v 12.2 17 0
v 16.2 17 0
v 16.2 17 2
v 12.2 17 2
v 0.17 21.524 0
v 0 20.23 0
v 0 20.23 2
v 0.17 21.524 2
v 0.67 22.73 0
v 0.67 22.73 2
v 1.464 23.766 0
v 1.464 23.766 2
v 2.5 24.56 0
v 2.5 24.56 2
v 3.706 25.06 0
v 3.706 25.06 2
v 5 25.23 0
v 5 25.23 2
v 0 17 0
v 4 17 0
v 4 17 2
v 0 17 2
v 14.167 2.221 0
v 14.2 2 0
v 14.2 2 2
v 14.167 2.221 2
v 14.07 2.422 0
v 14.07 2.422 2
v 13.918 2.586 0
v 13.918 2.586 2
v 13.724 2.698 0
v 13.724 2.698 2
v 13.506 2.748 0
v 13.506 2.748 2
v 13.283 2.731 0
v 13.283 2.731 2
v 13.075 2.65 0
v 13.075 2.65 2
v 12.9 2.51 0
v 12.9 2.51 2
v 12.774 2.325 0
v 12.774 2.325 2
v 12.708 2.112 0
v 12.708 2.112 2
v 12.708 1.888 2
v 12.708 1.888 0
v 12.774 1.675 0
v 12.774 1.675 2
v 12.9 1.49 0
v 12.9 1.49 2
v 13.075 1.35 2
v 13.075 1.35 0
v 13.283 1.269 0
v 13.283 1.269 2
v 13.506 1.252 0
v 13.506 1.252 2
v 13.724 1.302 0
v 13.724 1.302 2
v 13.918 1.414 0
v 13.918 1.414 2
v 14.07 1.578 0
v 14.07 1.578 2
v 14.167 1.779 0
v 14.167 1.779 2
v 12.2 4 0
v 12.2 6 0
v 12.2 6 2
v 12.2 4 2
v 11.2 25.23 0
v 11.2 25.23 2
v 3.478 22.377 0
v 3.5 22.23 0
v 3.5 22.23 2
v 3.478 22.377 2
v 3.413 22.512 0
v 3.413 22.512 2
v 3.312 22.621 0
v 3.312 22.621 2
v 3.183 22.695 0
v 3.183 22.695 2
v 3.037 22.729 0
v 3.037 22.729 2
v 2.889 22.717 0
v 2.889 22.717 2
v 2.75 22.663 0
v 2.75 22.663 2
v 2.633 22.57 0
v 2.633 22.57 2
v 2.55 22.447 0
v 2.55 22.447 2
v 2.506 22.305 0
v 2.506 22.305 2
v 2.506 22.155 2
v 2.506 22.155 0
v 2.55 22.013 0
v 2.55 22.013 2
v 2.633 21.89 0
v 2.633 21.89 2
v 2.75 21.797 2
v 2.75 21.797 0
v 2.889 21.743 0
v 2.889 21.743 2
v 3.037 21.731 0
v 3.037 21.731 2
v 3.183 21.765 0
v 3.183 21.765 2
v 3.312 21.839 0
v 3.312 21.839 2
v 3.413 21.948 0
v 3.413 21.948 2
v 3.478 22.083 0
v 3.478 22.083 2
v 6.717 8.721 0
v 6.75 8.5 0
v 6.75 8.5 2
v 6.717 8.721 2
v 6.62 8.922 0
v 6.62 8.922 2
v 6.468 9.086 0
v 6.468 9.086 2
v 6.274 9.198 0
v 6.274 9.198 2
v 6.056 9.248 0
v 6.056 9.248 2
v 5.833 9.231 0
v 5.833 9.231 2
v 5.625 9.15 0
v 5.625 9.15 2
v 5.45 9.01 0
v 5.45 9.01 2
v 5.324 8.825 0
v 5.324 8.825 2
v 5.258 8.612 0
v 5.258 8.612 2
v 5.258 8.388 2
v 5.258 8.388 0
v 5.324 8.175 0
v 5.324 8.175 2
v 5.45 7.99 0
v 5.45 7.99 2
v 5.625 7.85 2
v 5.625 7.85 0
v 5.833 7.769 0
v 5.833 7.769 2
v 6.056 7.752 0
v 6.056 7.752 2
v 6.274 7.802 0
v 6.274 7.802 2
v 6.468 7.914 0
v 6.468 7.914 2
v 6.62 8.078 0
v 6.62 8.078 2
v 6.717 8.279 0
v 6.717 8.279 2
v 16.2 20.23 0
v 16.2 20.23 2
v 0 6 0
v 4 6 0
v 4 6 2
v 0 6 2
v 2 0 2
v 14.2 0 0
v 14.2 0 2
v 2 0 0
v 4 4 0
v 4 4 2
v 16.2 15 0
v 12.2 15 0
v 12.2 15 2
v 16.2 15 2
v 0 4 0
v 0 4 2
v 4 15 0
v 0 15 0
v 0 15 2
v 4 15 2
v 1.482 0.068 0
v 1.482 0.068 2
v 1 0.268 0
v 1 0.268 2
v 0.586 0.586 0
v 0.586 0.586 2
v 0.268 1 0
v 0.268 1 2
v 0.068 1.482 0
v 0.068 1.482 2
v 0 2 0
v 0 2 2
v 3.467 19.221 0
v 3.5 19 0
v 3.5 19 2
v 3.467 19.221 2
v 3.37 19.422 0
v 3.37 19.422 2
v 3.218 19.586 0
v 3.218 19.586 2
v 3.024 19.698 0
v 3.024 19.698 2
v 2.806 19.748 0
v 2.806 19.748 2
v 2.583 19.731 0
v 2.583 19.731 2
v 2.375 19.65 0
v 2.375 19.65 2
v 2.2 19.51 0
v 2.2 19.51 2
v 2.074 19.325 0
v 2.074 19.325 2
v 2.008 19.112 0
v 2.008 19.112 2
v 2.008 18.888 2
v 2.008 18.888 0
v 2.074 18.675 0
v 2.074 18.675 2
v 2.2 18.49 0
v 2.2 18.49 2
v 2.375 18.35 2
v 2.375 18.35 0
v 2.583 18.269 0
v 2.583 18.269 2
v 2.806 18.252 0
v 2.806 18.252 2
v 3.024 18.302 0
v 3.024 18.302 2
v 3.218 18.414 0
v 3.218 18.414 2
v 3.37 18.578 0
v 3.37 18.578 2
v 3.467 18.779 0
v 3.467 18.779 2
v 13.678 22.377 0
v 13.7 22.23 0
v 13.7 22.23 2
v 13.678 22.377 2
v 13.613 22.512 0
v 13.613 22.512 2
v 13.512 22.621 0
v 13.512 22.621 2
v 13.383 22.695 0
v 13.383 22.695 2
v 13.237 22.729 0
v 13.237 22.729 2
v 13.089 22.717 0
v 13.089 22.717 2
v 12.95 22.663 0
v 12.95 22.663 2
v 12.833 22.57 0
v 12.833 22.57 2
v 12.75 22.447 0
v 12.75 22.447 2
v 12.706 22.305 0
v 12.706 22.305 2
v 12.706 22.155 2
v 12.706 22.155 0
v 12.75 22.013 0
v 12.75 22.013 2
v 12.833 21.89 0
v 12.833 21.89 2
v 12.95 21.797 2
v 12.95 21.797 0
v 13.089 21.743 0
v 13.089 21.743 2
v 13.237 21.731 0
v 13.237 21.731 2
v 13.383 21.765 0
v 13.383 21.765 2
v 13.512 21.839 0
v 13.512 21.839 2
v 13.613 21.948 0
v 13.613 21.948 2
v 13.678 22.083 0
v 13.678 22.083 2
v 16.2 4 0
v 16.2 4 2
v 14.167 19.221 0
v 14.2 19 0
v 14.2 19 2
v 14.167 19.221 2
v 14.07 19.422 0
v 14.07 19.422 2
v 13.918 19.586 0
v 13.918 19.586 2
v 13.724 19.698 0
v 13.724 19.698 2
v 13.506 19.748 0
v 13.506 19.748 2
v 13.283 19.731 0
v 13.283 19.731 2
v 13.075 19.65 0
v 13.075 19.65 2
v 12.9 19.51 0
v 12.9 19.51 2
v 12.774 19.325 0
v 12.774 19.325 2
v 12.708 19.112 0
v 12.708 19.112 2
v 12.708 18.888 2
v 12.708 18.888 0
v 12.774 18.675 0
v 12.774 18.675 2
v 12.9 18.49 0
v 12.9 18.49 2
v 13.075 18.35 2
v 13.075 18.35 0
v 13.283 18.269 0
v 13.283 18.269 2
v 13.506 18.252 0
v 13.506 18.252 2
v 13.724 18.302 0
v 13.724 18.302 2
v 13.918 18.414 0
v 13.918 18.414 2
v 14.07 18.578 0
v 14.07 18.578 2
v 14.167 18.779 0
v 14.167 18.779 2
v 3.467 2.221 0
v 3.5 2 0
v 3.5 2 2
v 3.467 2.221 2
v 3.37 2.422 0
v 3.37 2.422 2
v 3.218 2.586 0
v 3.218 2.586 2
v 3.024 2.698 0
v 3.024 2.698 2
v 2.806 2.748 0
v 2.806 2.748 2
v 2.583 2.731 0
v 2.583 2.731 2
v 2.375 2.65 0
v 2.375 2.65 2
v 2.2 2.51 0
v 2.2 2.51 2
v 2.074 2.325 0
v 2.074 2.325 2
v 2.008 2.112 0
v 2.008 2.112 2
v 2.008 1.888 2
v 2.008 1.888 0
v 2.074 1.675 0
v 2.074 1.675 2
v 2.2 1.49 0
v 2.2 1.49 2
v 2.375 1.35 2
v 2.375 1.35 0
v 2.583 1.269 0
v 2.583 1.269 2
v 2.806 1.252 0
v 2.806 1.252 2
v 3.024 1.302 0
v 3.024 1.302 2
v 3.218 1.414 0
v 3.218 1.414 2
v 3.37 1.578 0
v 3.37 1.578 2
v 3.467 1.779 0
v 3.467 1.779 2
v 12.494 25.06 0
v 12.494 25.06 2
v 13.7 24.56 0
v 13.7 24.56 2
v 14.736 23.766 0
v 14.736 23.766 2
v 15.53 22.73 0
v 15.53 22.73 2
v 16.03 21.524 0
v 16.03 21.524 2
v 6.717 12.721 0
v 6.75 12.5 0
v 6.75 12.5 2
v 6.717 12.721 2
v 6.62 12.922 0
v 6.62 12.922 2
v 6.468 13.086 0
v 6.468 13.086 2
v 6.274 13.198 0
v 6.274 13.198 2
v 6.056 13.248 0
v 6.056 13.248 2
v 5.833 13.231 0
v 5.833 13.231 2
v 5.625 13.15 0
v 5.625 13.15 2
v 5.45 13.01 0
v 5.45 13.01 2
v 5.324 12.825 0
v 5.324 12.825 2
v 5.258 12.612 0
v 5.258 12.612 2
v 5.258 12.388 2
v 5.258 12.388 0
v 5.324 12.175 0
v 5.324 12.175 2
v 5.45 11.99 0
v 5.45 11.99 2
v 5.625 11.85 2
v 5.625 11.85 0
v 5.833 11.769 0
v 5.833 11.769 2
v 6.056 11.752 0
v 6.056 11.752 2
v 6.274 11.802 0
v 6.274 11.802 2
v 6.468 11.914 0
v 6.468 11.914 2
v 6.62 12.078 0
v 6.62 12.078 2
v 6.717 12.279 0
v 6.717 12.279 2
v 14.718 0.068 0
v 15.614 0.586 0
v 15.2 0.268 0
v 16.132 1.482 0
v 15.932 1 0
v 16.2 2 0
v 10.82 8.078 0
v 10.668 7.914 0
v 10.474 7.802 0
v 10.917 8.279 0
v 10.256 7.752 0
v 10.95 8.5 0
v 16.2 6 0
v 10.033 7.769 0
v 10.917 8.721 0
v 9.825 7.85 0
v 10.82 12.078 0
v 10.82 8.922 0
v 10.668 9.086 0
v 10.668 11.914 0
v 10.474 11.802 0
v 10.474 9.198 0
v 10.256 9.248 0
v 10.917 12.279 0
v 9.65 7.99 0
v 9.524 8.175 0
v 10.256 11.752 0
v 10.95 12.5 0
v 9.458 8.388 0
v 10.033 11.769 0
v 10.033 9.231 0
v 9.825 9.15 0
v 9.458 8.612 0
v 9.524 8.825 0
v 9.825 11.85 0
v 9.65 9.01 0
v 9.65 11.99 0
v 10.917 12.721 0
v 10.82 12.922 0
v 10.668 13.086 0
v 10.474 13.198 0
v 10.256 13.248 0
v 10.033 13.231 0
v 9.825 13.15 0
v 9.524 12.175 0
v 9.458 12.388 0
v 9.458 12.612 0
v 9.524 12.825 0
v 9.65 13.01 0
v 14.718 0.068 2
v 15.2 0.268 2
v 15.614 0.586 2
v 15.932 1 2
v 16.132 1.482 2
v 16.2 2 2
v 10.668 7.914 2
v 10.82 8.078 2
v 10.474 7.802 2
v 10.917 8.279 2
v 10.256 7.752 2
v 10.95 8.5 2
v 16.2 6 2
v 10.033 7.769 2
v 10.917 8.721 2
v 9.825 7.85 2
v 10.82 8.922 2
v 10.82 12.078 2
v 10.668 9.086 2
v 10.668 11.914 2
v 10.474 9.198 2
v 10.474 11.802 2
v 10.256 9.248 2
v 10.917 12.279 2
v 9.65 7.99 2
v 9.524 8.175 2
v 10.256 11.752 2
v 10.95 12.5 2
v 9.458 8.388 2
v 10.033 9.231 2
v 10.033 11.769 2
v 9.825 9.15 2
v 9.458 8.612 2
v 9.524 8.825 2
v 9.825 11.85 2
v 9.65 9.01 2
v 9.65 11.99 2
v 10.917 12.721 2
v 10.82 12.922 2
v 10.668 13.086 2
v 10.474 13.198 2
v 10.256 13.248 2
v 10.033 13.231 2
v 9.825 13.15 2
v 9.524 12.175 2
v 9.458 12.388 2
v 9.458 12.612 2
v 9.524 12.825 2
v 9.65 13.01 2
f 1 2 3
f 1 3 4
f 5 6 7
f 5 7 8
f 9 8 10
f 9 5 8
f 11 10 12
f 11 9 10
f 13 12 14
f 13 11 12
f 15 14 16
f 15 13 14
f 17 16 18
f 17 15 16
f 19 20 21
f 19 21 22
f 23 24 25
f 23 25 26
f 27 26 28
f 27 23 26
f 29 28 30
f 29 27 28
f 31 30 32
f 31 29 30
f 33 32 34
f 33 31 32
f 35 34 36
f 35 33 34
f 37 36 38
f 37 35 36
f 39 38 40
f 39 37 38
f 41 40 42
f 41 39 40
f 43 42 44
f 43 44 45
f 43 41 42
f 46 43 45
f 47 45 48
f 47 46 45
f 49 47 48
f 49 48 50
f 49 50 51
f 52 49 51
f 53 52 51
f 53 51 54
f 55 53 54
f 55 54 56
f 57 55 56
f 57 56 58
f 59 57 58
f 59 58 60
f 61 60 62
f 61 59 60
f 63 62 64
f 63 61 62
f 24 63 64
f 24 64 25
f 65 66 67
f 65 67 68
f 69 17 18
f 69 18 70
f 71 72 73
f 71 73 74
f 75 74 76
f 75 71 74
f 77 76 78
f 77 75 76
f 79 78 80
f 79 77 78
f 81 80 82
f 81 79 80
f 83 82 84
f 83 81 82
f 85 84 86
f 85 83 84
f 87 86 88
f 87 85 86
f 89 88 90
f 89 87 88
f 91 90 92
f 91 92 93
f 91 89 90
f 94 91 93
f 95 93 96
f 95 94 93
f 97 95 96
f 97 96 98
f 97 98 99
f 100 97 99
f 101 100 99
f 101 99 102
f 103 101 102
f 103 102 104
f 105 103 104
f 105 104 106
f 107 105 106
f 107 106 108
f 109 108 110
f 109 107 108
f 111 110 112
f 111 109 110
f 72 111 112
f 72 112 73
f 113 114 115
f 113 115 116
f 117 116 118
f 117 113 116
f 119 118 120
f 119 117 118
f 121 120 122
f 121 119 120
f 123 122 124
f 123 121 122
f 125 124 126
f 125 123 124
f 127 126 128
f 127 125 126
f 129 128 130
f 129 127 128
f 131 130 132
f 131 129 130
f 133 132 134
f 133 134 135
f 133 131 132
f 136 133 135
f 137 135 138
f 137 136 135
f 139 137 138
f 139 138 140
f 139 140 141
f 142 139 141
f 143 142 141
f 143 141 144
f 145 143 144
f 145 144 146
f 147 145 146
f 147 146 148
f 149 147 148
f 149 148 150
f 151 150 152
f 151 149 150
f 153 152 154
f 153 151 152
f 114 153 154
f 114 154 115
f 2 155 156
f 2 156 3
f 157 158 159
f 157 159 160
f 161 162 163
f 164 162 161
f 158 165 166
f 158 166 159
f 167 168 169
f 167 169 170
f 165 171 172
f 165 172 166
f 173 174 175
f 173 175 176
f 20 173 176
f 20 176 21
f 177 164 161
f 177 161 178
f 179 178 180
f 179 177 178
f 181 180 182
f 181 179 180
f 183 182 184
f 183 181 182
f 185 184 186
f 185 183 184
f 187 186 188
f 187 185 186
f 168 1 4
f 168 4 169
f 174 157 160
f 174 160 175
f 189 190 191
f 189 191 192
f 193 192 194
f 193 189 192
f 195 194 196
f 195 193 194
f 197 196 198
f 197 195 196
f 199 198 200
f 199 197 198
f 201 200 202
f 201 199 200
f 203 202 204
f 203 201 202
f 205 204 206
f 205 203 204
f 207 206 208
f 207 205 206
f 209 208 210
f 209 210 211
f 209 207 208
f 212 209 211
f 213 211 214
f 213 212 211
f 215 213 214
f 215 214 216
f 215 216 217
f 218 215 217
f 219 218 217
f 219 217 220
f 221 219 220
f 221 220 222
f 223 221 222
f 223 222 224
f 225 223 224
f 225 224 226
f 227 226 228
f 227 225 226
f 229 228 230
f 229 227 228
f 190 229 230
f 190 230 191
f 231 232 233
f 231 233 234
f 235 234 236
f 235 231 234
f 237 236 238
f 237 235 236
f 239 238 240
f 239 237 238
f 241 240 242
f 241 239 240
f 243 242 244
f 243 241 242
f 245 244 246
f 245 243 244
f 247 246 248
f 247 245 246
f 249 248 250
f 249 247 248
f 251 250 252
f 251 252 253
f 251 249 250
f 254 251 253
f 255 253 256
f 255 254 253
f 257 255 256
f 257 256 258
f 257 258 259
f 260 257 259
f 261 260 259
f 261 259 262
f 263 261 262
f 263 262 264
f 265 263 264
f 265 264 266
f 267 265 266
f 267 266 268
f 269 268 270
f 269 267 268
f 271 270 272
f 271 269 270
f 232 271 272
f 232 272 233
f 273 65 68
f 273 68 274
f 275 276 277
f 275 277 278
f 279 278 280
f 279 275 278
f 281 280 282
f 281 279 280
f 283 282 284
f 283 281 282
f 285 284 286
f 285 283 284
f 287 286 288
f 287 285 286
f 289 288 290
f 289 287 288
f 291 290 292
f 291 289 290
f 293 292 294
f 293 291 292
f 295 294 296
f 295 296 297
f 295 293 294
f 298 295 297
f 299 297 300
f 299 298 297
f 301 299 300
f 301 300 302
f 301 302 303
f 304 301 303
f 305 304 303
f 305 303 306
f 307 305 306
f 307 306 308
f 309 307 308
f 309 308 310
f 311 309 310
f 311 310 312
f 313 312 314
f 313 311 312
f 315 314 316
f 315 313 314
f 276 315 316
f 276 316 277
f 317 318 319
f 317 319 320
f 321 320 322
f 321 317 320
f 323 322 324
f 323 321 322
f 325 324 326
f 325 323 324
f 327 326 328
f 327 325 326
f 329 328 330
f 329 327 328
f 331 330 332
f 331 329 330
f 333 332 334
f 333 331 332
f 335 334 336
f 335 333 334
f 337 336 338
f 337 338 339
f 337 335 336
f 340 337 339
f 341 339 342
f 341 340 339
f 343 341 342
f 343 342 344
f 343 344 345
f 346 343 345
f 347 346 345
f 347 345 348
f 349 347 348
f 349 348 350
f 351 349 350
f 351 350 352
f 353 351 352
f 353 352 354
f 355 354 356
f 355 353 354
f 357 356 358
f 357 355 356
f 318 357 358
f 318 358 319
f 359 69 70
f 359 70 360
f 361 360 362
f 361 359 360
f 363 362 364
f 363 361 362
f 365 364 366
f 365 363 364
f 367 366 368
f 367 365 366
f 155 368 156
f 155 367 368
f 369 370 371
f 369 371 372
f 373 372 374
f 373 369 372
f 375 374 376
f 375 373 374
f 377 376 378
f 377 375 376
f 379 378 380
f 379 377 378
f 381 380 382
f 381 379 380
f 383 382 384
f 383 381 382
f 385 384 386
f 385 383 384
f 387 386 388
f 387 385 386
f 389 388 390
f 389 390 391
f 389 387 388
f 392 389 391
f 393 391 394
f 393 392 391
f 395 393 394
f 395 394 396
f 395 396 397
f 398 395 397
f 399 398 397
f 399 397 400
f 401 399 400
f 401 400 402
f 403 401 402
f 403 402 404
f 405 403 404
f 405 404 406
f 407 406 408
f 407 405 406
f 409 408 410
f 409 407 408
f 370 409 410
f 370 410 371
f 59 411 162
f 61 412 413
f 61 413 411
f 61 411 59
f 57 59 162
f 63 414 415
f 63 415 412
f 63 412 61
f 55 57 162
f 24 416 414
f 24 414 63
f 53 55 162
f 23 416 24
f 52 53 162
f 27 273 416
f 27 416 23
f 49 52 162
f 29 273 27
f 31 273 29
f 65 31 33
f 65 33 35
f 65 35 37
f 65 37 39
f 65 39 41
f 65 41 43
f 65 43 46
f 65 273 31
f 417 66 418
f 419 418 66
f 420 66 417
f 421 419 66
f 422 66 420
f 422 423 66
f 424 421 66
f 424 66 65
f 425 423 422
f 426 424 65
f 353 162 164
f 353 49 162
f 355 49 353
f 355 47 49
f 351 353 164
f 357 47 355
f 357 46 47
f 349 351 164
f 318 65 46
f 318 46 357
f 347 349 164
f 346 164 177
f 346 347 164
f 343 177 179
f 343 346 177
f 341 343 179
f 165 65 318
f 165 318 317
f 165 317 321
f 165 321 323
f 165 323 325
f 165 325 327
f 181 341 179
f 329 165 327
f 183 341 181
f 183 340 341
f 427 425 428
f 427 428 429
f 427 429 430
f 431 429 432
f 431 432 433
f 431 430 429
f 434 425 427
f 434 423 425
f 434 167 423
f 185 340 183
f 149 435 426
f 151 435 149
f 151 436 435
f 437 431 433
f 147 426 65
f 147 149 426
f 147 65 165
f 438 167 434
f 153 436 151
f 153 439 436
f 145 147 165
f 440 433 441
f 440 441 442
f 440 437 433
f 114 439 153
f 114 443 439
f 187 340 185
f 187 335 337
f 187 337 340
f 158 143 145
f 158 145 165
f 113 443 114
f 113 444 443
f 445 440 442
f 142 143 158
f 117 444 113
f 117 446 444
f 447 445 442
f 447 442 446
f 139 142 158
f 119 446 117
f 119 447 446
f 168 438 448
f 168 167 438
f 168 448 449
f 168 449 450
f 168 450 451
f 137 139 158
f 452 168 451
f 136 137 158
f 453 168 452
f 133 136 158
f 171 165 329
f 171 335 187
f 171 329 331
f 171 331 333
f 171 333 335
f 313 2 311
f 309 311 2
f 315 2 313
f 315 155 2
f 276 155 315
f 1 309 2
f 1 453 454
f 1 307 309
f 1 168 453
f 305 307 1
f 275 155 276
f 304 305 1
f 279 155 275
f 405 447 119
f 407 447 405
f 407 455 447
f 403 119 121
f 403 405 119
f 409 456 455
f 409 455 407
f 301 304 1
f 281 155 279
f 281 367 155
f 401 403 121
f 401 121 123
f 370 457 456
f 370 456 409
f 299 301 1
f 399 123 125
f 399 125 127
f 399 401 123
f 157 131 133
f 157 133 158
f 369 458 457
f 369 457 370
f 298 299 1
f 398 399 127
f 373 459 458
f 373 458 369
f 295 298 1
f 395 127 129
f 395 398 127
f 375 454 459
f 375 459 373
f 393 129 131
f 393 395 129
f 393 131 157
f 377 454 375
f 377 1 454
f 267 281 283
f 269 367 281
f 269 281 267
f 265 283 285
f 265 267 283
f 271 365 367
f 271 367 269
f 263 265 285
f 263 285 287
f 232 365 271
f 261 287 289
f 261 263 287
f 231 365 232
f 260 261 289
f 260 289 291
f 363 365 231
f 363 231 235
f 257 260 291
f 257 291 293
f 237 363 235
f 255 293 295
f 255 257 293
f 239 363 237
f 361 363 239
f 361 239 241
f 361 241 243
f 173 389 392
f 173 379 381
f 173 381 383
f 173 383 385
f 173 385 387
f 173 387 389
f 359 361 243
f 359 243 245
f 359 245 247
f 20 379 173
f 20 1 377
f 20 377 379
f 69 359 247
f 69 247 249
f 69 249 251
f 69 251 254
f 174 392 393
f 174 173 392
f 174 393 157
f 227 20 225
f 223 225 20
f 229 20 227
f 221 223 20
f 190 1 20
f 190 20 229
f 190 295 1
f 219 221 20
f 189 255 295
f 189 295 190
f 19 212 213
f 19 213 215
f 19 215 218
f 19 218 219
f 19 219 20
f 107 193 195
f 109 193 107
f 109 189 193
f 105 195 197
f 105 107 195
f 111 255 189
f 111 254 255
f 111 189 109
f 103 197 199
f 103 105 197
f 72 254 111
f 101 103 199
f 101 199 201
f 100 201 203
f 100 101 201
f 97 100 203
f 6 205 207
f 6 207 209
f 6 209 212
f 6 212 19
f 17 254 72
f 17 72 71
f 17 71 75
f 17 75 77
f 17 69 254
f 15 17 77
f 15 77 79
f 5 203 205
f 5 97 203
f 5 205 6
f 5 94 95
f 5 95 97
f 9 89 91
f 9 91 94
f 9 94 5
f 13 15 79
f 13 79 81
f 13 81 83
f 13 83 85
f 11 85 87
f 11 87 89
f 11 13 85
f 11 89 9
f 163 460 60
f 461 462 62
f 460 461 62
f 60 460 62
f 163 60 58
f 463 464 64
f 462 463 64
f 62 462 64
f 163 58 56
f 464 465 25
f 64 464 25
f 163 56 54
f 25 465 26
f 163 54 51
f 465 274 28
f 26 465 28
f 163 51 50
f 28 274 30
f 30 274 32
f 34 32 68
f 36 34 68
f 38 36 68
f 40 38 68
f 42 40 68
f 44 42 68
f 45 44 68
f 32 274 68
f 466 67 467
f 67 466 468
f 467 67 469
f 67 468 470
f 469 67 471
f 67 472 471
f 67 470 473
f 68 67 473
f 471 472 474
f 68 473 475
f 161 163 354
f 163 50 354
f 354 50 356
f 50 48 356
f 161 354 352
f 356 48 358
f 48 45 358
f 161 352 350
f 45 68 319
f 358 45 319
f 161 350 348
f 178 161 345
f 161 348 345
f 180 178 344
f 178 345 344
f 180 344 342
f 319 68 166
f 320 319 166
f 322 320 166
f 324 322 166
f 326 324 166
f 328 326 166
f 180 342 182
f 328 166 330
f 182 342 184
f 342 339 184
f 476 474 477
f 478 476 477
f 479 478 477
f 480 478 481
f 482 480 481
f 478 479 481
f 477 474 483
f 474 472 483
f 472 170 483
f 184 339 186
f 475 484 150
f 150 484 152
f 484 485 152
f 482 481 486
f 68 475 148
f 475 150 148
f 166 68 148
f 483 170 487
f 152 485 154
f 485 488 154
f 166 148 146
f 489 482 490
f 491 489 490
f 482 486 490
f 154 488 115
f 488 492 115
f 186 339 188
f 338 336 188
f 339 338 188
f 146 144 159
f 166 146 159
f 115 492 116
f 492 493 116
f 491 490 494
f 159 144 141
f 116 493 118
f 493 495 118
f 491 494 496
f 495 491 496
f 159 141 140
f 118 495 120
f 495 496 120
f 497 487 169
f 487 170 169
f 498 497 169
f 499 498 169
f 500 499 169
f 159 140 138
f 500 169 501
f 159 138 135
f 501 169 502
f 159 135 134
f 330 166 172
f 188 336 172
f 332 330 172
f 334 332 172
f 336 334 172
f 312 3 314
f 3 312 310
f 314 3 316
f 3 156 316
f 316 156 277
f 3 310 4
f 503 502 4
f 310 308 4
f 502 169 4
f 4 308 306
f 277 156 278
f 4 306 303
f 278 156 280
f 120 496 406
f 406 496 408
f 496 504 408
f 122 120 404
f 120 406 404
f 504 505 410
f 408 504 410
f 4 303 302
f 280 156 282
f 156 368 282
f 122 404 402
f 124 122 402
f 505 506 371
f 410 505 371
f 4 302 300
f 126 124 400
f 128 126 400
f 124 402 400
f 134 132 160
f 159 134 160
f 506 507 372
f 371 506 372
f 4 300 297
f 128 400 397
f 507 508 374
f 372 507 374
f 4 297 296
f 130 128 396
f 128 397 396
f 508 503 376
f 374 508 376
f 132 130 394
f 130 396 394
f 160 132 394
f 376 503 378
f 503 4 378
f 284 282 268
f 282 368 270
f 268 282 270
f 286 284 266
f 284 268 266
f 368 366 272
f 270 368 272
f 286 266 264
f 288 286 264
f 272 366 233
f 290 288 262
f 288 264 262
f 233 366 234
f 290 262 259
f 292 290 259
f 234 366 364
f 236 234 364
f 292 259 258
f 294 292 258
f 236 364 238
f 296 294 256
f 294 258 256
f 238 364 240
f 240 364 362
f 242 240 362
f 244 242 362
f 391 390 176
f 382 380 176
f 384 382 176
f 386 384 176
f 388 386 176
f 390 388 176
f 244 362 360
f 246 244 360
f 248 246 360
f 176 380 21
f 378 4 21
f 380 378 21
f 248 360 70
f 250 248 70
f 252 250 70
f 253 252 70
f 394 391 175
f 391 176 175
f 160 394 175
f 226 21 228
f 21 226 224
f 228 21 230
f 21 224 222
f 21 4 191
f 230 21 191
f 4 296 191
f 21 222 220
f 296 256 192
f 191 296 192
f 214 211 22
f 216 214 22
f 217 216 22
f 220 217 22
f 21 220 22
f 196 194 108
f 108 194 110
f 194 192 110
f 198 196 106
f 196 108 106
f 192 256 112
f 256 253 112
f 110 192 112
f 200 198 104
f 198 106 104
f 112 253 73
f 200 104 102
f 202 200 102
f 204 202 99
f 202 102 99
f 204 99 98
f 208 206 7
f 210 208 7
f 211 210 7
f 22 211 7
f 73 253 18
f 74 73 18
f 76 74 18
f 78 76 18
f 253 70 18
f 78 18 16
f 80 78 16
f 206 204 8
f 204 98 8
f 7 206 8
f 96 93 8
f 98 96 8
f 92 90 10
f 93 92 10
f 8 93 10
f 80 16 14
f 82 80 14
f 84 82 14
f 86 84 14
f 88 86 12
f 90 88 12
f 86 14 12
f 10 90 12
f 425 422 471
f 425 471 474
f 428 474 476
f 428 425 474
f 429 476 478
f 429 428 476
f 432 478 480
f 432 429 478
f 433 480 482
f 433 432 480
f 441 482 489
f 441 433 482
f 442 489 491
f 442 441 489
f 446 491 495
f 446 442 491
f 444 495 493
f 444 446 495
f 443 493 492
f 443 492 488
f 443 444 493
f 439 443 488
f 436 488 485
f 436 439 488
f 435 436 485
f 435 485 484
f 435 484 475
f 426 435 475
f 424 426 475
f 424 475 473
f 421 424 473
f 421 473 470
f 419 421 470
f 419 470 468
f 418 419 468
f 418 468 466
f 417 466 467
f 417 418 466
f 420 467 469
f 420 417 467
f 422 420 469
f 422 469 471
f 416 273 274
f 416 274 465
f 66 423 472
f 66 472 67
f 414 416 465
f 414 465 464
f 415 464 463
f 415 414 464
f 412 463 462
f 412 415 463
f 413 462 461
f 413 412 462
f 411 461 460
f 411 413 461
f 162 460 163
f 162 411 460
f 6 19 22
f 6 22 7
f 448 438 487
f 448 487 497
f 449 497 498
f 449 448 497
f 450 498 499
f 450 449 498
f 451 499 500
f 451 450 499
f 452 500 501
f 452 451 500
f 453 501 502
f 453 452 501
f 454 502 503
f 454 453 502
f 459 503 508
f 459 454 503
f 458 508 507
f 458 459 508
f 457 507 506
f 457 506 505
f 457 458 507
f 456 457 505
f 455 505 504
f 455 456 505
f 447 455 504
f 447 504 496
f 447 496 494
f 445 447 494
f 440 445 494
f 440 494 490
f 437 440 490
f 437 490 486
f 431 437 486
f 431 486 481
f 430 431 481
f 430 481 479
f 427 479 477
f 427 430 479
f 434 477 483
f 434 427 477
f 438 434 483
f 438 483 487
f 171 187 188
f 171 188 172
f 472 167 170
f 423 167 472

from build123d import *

# Parameters (mm, degrees)
SKETCH1_R           = 0.75
SKETCH1_R_2         = 0.5
BOSS_EXTRUDE1_DEPTH = 2


with BuildPart() as part:
    # Sketch1 → Boss-Extrude1 (new body)
    with BuildSketch(Plane.XY):
        with BuildLine():
            Line((12.2, 4), (16.2, 4))
            Line((16.2, 4), (16.2, 2))
            ThreePointArc((16.2, 2), (15.614213562, 0.585786438), (14.2, 0))
            Line((14.2, 0), (2, 0))
            ThreePointArc((2, 0), (0.585786438, 0.585786438), (0, 2))
            Line((0, 2), (0, 4))
            Line((0, 4), (4, 4))
            Line((4, 4), (4, 6))
            Line((4, 6), (0, 6))
            Line((0, 6), (0, 15))
            Line((0, 15), (4, 15))
            Line((4, 15), (4, 17))
            Line((4, 17), (0, 17))
            Line((0, 17), (0, 20.23))
            ThreePointArc((0, 20.23), (1.464466094, 23.765533906), (5, 25.23))
            Line((5, 25.23), (11.2, 25.23))
            ThreePointArc((11.2, 25.23), (14.735533906, 23.765533906), (16.2, 20.23))
            Line((16.2, 20.23), (16.2, 17))
            Line((16.2, 17), (12.2, 17))
            Line((12.2, 17), (12.2, 15))
            Line((12.2, 15), (16.2, 15))
            Line((16.2, 15), (16.2, 6))
            Line((16.2, 6), (12.2, 6))
            Line((12.2, 6), (12.2, 4))
        make_face()
        with Locations((13.45, 2)):
            Circle(SKETCH1_R, mode=Mode.SUBTRACT)
        with Locations((13.2, 22.23)):
            Circle(SKETCH1_R_2, mode=Mode.SUBTRACT)
        with Locations((10.2, 8.5)):
            Circle(SKETCH1_R, mode=Mode.SUBTRACT)
        with Locations((13.45, 19)):
            Circle(SKETCH1_R, mode=Mode.SUBTRACT)
        with Locations((10.2, 12.5)):
            Circle(SKETCH1_R, mode=Mode.SUBTRACT)
        with Locations((6, 12.5)):
            Circle(SKETCH1_R, mode=Mode.SUBTRACT)
        with Locations((2.75, 19)):
            Circle(SKETCH1_R, mode=Mode.SUBTRACT)
        with Locations((6, 8.5)):
            Circle(SKETCH1_R, mode=Mode.SUBTRACT)
        with Locations((3, 22.23)):
            Circle(SKETCH1_R_2, mode=Mode.SUBTRACT)
        with Locations((2.75, 2)):
            Circle(SKETCH1_R, mode=Mode.SUBTRACT)
    extrude(amount=BOSS_EXTRUDE1_DEPTH)


solid = part.part
